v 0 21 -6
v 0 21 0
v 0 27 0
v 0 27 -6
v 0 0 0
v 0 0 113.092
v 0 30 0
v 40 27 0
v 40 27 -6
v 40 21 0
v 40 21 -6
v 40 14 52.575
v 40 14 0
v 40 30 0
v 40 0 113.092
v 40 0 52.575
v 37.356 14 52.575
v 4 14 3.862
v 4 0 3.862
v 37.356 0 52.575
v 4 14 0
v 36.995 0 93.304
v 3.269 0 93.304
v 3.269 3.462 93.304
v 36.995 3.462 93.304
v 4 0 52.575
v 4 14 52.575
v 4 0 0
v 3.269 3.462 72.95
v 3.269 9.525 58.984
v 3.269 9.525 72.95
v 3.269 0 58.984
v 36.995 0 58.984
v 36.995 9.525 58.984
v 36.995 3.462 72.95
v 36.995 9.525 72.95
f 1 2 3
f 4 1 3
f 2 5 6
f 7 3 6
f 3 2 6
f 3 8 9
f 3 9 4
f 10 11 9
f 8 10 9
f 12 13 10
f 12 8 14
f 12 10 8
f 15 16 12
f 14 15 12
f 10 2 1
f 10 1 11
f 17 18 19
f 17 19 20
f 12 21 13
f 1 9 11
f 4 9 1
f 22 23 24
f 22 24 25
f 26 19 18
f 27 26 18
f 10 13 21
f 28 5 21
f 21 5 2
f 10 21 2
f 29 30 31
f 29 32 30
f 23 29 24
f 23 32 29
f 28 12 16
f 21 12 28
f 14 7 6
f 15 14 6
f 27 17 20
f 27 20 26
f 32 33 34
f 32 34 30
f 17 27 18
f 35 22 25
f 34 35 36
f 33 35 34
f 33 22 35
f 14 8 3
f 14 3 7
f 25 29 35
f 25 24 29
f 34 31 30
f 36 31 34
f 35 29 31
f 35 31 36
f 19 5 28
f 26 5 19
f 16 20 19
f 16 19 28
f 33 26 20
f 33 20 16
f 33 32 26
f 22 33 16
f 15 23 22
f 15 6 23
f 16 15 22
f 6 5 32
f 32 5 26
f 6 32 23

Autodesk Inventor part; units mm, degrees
ref_plane "YZ Plane" through (0, 0, 0) normal (1, 0, 0) x (0, 1, 0)
ref_plane "XZ Plane" through (0, 0, 0) normal (0, 1, 0) x (-1, 0, 0)
ref_plane "XY Plane" through (0, 0, 0) normal (0, 0, 1) x (1, 0, 0)
sketch "Sketch1" plane through (0, 0, 0) normal (1, 0, 0) x (0, 1, 0)
  line L0 (0, 0) -> (24, 0)
  line L1 (24, 0) -> (0, 89.5692)
  line L2 (0, 89.5692) -> (0, 0)
  line L3 (24, 0) -> (30, 0)
  line L4 (7.8518, 60.2659) -> (13.6473, 61.8188)
  line L5 (30, 0) -> (0, 113.0916)
  line L6 (0, 113.0916) -> (0, 89.5692)
  point P0 (0, 23.8051)
  point P1 (17.3305, 0)
  point P2 (0, 30.632)
  dimension "d0" = 24
  dimension "d1" = 75
  dimension "d2" = 6
  dimension "d3" = 6
  dimension "d4" = 90
extrude "Extrusion1" add sketch "Sketch1" along normal blind 40
sketch "Sketch5" plane through (0, 0, 0) normal (0, 0, -1) x (-1, 0, 0)
  line L0 (0, 0) -> (0, 30) projected
  line L1 (-40, 0) -> (-4, 0)
  line L2 (-4, 0) -> (-4, 14)
  line L3 (-4, 14) -> (-40, 14)
  line L4 (-40, 14) -> (-40, 0)
  point P0 (0, 18)
  dimension "d24" = 36
  dimension "d25" = 14
extrude "Extrusion2" cut sketch "Sketch5" against normal blind 52.575
sketch "Sketch7" plane through (4, 14, 0) normal (0, -1, 0) x (1, 0, 0)
  line L0 (0, 0) -> (0, 52.575) projected
  line L1 (36, 52.575) -> (0, 0)
  line L2 (0, 0) -> (0, 3.8616)
  line L3 (0, 3.8616) -> (33.3558, 52.575)
  line L4 (36, 52.575) -> (0, 52.575) projected
  line L5 (33.3558, 52.575) -> (36, 52.575)
  point P0 (-4, 0)
extrude "Extrusion4" add sketch "Sketch7" along normal blind 14 contours L0 L3 L4 L1
sketch "Sketch8" plane through (0, 0, 0) normal (0, -1, 0) x (1, 0, 0)
  line L0 (36.9948, 58.9837) -> (3.2686, 58.9837)
  line L1 (3.2686, 58.9837) -> (3.2686, 93.3042)
  line L2 (3.2686, 93.3042) -> (36.9948, 93.3042)
  line L3 (36.9948, 93.3042) -> (36.9948, 58.9837)
  point P0 (0, 0)
extrude "Extrusion5" cut sketch "Sketch8" against normal blind 3.4625
sketch "Sketch9" plane through (0, 3.4625, 0) normal (0, -1, 0) x (1, 0, 0)
  line L0 (36.9948, 58.9837) -> (3.2686, 58.9837) projected
  line L1 (3.2686, 58.9837) -> (3.2686, 93.3042) projected
  line L2 (36.9948, 58.9837) -> (3.2686, 58.9837)
  line L3 (3.2686, 58.9837) -> (3.2686, 72.9495)
  line L4 (3.2686, 72.9495) -> (36.9948, 72.9495)
  line L5 (36.9948, 72.9495) -> (36.9948, 58.9837)
  point P0 (0, 0)
extrude "Extrusion6" cut sketch "Sketch9" against normal blind 6.0625
sketch "Sketch10" plane through (0, 0, 0) normal (0, 0, -1) x (-1, 0, 0)
  line L0 (-40, 30) -> (-40, 0) projected
  line L1 (0, 30) -> (0, 0) projected
  line L2 (-40, 27) -> (0, 27)
  line L3 (0, 27) -> (0, 21)
  line L4 (0, 21) -> (-40, 21)
  line L5 (-40, 21) -> (-40, 27)
  line L6 (0, 30) -> (-40, 30) projected
  dimension "d35" = 6
  dimension "d36" = 3
extrude "Extrusion7" add sketch "Sketch10" along normal blind 6 contours L2 L1 L4 L0
properties part number "RAMP"
